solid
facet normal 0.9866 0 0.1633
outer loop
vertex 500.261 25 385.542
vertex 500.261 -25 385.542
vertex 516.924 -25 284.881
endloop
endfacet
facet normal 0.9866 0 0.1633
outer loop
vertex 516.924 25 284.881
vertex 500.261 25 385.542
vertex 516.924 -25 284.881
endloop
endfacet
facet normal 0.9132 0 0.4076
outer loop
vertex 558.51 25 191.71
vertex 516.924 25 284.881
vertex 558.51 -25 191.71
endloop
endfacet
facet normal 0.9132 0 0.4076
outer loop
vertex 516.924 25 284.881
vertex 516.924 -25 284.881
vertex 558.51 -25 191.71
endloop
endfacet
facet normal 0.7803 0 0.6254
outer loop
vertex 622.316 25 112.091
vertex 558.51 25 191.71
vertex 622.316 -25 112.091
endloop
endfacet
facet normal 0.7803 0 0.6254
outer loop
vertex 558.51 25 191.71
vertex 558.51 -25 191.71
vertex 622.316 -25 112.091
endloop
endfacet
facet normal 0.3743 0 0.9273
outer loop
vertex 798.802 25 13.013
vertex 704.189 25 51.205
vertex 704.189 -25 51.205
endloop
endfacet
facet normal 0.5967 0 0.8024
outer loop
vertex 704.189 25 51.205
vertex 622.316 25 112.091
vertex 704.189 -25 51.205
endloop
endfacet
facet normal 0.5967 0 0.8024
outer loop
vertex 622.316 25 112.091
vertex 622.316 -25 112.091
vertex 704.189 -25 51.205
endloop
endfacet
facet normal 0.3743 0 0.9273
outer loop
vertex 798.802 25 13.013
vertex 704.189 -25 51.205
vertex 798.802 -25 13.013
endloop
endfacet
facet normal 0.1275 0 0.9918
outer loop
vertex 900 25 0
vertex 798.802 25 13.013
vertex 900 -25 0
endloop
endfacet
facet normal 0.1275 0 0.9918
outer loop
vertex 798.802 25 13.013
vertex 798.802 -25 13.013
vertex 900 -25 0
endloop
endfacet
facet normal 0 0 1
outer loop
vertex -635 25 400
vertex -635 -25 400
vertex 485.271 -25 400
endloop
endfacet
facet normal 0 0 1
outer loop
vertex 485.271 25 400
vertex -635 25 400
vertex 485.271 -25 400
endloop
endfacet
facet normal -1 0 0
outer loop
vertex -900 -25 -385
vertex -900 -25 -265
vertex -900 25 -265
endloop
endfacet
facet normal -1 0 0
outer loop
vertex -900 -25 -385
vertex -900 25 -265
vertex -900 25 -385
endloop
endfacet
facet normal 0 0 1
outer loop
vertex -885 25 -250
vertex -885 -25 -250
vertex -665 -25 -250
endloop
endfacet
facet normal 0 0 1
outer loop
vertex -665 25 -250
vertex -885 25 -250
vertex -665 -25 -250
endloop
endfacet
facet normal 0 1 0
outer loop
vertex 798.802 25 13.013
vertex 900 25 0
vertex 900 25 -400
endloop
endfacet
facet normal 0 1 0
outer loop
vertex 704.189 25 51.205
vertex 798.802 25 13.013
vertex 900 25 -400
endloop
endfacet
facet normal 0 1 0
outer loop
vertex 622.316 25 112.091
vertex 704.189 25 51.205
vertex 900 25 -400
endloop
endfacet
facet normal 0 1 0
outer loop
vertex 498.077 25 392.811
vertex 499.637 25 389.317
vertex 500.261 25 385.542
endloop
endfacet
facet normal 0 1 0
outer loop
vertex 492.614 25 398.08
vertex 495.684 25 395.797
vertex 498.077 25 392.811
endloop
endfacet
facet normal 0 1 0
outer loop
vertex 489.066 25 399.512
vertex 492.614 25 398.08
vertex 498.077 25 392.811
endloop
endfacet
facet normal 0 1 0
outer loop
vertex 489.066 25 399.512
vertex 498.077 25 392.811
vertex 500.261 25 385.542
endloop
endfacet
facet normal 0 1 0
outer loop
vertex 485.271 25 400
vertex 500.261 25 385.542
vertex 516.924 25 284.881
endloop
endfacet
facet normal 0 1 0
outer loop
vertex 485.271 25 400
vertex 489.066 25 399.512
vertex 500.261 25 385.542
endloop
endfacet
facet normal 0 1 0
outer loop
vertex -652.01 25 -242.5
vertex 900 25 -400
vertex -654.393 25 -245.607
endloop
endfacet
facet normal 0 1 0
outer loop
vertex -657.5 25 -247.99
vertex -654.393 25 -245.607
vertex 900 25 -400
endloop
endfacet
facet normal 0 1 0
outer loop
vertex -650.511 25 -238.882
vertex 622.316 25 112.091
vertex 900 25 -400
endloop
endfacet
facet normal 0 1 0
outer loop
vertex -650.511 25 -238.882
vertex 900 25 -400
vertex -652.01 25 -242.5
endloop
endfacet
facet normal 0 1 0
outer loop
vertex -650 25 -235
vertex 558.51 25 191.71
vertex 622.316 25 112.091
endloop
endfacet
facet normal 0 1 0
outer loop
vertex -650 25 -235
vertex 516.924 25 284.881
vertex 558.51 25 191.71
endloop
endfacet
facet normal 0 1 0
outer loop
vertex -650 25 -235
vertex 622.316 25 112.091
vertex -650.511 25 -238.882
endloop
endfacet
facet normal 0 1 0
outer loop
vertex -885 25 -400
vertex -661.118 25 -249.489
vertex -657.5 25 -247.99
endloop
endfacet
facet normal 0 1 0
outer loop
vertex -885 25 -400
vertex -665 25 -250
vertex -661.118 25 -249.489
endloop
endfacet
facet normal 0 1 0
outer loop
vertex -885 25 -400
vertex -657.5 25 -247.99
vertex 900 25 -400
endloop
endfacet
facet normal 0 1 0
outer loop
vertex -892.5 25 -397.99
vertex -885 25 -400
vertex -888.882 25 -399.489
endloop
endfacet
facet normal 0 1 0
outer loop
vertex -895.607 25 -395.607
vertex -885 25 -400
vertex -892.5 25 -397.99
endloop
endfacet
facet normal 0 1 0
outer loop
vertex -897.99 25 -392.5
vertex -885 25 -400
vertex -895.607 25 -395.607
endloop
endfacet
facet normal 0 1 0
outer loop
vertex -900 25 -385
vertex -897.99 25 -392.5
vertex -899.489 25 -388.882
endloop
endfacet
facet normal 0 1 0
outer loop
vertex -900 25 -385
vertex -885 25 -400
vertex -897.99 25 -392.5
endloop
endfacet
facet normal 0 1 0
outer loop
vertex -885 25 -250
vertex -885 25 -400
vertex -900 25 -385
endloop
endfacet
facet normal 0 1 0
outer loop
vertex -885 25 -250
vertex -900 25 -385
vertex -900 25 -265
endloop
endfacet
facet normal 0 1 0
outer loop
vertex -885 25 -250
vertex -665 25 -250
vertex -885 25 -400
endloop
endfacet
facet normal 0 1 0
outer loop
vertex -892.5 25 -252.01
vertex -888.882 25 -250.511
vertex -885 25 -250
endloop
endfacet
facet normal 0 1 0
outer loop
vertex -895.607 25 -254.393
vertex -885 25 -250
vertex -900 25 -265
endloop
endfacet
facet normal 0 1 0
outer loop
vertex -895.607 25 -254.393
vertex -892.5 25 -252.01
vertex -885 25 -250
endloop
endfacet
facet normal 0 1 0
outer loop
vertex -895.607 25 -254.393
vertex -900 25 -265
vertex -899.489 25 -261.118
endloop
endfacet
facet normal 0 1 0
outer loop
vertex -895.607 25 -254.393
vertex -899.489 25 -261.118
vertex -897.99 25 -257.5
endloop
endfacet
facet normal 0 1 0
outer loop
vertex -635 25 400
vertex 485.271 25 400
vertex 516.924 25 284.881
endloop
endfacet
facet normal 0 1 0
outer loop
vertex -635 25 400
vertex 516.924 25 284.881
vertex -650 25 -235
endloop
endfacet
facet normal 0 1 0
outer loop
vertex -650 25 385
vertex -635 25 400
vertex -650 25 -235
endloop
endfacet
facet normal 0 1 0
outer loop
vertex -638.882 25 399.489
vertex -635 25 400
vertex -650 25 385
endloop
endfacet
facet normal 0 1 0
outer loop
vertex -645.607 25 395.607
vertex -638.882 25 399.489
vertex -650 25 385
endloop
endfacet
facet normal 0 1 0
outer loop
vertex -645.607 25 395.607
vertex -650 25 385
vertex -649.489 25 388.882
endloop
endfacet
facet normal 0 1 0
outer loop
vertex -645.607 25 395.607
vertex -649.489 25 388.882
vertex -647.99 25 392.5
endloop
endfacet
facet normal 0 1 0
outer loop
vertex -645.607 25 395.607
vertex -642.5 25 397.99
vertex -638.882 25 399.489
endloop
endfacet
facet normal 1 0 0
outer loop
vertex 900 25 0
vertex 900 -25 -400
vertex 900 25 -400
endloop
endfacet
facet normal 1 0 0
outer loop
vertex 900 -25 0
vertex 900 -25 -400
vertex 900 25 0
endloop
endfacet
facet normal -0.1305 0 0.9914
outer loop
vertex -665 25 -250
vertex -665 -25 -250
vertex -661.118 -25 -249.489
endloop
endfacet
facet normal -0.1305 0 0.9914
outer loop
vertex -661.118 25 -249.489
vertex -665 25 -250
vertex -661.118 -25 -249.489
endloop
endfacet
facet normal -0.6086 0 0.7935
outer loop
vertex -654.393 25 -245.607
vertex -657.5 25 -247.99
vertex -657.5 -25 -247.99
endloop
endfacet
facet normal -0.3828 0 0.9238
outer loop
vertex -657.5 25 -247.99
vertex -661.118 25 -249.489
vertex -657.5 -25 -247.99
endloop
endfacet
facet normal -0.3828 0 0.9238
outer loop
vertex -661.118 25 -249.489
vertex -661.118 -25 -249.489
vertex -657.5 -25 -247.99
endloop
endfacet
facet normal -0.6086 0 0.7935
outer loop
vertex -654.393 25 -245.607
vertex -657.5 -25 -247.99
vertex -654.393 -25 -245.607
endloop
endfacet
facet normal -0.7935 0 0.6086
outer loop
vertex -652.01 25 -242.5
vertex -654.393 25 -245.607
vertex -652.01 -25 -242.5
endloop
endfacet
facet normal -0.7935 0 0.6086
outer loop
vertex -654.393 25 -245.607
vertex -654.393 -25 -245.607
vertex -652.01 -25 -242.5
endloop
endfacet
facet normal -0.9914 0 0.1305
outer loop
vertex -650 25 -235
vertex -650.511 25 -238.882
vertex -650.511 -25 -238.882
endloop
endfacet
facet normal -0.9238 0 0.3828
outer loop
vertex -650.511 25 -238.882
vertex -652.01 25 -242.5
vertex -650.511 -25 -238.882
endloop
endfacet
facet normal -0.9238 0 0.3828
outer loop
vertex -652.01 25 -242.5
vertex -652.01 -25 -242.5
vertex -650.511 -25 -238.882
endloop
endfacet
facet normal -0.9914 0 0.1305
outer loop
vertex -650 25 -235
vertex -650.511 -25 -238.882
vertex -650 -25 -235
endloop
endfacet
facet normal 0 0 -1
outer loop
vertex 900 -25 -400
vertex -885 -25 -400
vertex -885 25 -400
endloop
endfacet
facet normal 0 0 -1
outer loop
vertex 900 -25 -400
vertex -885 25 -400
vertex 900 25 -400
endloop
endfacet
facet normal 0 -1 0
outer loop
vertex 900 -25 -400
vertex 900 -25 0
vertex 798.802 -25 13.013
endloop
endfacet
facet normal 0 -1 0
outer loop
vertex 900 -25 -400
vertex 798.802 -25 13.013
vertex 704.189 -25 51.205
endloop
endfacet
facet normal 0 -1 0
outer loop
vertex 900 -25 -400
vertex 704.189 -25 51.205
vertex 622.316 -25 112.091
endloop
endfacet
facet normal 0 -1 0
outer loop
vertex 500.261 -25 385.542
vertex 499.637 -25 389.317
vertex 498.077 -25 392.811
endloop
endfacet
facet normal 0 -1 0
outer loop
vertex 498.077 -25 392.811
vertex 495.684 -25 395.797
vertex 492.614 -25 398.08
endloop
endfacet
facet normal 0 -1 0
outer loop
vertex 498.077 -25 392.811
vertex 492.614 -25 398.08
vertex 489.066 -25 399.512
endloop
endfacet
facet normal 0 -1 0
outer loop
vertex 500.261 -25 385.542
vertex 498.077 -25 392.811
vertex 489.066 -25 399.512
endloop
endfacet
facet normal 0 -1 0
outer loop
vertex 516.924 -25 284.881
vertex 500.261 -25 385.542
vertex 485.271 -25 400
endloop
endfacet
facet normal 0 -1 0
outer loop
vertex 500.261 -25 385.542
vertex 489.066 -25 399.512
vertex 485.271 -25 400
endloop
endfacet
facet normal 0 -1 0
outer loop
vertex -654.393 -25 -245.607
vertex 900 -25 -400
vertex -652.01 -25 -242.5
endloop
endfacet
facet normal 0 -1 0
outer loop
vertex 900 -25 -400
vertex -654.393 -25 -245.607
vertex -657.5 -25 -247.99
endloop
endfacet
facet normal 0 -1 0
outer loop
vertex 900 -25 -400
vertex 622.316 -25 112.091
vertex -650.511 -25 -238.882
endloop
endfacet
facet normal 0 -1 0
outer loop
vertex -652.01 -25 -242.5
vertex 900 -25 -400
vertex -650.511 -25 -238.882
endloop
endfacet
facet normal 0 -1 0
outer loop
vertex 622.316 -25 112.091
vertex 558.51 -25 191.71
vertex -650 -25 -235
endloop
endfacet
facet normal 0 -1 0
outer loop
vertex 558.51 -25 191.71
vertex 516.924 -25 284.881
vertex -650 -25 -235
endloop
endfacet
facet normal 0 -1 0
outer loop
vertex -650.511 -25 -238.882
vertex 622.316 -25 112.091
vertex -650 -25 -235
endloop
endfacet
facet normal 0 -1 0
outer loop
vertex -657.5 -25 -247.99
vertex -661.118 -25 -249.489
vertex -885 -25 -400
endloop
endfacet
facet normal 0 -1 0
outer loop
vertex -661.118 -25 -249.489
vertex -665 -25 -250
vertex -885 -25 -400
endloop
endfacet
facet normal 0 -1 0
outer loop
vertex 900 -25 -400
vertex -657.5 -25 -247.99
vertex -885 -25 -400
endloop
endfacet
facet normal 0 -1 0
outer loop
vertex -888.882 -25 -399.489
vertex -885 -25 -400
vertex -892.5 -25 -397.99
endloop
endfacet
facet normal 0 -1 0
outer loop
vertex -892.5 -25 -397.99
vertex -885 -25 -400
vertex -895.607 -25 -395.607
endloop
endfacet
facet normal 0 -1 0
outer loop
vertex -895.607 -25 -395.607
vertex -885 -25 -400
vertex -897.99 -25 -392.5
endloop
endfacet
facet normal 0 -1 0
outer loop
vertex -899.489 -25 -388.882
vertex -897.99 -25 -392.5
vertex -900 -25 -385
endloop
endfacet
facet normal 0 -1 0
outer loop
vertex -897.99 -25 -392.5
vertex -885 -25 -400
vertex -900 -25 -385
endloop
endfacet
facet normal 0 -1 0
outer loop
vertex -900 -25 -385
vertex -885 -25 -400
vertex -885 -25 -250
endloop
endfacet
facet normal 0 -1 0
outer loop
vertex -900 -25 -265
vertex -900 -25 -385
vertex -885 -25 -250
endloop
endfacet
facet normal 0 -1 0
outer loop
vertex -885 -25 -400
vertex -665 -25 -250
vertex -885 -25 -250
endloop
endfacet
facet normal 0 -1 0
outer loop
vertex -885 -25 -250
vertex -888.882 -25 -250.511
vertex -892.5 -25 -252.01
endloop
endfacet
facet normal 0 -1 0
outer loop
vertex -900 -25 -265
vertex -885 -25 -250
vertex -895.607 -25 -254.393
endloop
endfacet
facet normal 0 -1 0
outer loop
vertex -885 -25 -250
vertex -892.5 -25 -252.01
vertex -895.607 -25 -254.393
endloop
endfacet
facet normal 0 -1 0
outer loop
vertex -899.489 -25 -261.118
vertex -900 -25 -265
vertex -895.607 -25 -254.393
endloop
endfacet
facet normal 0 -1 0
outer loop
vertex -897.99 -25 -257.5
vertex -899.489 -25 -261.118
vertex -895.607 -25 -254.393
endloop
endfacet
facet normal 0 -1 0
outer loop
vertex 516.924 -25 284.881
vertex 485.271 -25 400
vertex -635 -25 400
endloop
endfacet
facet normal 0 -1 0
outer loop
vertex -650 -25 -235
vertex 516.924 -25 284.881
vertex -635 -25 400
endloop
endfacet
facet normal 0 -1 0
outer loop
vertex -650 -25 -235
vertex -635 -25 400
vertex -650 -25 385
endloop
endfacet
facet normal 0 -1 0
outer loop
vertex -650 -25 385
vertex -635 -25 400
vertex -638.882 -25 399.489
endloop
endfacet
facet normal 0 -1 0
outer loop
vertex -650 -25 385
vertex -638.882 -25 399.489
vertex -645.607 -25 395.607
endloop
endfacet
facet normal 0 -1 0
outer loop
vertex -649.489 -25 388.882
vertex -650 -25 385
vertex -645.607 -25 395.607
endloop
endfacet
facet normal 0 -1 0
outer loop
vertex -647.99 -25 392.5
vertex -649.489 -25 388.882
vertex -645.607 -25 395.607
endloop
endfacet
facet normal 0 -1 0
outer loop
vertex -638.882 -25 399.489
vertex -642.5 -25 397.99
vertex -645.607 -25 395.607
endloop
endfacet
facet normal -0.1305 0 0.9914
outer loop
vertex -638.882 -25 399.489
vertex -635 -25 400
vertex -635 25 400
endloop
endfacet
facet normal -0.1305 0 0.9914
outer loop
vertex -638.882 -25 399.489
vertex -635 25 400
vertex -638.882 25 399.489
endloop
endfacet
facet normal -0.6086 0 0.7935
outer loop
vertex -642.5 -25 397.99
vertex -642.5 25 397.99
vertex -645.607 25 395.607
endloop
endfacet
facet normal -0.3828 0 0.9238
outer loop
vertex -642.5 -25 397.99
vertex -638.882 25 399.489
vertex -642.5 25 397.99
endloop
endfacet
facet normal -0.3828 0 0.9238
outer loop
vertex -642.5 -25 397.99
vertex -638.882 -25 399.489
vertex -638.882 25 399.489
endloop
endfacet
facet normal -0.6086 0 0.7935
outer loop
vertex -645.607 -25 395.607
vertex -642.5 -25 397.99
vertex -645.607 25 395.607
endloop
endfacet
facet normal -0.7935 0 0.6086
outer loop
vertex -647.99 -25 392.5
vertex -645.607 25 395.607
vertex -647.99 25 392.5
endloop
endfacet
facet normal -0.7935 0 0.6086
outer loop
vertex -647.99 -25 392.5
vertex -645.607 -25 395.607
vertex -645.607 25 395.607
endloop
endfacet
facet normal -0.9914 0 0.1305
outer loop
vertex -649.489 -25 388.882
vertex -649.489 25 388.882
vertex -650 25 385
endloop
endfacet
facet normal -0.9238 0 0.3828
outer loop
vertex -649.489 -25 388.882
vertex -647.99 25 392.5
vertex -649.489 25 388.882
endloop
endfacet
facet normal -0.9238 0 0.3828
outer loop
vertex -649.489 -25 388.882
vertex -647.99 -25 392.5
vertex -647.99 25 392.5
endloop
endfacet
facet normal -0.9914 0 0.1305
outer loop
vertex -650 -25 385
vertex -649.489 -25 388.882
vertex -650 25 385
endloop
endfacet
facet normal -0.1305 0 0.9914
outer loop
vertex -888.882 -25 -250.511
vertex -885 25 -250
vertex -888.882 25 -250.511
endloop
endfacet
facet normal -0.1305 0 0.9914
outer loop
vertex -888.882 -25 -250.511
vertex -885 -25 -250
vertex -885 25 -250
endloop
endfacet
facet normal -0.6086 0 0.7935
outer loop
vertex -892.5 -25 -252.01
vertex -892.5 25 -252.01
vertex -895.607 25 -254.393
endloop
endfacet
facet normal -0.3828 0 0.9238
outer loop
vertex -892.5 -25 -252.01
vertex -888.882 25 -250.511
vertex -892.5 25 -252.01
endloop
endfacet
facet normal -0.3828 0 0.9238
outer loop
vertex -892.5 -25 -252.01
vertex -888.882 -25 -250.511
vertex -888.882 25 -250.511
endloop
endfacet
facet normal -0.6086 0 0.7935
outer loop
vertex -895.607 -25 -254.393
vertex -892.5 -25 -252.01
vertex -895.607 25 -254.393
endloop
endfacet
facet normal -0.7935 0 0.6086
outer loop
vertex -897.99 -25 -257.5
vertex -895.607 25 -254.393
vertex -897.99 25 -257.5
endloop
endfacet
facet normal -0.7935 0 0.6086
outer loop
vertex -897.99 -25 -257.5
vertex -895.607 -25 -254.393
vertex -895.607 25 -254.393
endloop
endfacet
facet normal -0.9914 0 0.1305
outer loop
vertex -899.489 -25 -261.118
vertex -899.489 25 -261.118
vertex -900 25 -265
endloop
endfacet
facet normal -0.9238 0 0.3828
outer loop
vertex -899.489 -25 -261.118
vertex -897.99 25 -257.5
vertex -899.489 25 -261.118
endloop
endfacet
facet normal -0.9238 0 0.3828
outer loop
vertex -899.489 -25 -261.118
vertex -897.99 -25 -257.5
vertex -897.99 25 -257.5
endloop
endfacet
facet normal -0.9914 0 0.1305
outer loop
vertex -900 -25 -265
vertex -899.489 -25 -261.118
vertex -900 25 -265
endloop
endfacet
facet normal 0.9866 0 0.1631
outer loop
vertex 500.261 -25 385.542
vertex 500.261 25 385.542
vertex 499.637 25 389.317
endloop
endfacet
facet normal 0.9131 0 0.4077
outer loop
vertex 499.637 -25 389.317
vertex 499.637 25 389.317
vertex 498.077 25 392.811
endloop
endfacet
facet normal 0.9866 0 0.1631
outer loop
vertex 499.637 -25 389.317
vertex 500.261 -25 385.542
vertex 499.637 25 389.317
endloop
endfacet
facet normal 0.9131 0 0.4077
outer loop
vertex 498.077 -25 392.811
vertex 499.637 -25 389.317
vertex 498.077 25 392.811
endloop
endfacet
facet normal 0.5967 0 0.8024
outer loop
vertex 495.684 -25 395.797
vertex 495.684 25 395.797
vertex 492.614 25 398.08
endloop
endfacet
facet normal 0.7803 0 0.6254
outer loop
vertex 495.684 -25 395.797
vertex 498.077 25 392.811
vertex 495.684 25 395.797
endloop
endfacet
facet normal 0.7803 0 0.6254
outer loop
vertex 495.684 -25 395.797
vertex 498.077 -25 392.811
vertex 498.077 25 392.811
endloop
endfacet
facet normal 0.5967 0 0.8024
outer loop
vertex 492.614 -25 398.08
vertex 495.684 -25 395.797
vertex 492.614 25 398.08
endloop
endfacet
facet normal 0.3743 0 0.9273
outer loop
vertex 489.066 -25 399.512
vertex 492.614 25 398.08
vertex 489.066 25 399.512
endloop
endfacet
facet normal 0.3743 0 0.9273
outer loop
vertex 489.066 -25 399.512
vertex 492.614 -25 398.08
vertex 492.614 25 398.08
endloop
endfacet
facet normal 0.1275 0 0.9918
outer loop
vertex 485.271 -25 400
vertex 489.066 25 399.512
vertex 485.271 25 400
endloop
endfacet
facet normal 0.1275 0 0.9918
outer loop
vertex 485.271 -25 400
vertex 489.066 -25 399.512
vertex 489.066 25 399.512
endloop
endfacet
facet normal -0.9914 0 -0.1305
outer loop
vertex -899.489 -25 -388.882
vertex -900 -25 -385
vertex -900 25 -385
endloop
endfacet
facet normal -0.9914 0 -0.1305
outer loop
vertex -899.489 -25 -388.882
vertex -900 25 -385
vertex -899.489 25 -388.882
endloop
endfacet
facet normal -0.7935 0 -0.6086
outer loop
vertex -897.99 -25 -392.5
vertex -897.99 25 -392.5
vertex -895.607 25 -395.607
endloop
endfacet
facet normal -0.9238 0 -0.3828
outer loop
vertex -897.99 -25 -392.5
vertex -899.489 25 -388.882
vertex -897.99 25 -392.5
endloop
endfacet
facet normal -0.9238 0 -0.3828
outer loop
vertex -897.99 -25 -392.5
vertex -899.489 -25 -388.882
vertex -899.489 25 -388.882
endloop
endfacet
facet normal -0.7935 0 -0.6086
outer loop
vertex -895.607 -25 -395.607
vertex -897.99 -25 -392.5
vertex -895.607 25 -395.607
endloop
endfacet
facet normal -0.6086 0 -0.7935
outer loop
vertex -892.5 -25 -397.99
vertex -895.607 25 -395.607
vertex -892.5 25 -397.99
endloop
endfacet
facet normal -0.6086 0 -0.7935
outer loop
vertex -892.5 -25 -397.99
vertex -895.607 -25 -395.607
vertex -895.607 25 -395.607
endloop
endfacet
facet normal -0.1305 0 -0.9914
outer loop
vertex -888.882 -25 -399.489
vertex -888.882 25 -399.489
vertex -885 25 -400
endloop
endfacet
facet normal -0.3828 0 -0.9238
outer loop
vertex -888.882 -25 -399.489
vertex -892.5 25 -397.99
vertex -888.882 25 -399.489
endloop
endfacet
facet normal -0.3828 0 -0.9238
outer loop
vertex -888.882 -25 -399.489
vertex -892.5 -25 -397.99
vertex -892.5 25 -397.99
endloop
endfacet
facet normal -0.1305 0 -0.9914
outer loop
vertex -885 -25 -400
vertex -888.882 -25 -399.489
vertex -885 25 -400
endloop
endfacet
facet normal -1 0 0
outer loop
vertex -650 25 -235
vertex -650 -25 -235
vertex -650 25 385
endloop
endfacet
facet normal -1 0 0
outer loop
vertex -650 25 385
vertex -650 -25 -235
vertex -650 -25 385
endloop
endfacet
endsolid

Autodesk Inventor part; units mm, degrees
ref_plane "YZ Plane" through (0, 0, 0) normal (1, 0, 0) x (0, 1, 0)
ref_plane "XZ Plane" through (0, 0, 0) normal (0, 1, 0) x (-1, 0, 0)
ref_plane "XY Plane" through (0, 0, 0) normal (0, 0, 1) x (1, 0, 0)
sketch "Esboço1" plane through (0, 0, 0) normal (0, 1, 0) x (-1, 0, 0)
  line L0 (-900, 400) -> (900, 400) construction
  line L1 (900, 400) -> (900, -400) construction
  line L2 (900, -400) -> (-900, -400) construction
  line L3 (-900, -400) -> (-900, 400) construction
  line L4 (-900, 400) -> (900, -400) construction
  line L5 (900, 400) -> (-900, -400) construction
  line L6 (900, -250) -> (650, -250) construction
  line L7 (650, -250) -> (650, 400) construction
  arc A0 (885, -400) -> (900, -385) centre (885, -385) ccw
  arc A1 (650, -235) -> (665, -250) centre (665, -235) ccw
  line L8 (885, -400) -> (-900, -400)
  line L9 (900, -385) -> (900, -250) construction
  line L10 (900, -250) -> (665, -250) construction
  line L11 (-900, -400) -> (-1700, -400) construction
  line L12 (-1700, -400) -> (-1700, 1400) construction
  line L13 (-1700, 1400) -> (-900, 1400) construction
  line L14 (-900, 1400) -> (-900, -400) construction
  circle A2 centre (-900, 400) radius 400 construction
  line L15 (900, 0) -> (-900, 0) construction
  line L16 (-1300, 1400) -> (-1300, -404.7673) construction
  arc A3 (-485.2712, 400) -> (-500.2614, 385.5422) centre (-485.2712, 385) ccw
  line L17 (650, -235) -> (650, 385)
  arc A4 (650, 385) -> (635, 400) centre (635, 385) ccw
  line L18 (635, 400) -> (-485.2712, 400)
  arc A5 (-900, 0) -> (-500.2614, 385.5422) centre (-900, 400) ccw
  line L19 (-900, -400) -> (-900, 0)
  arc A6 (900, -265) -> (885, -250) centre (885, -265) ccw
  line L20 (900, -265) -> (900, -385)
  line L21 (885, -250) -> (665, -250)
  point P0 (0, 0)
  dimension "d11" = 800
  dimension "d0" = 800
  dimension "d1" = 1800
  dimension "d3" = 650
  dimension "d5" = 15
  dimension "d6" = 800
  dimension "d7" = 1800
  dimension "d9" = 250
  dimension "d13" = 400
  dimension "d14" = 400
  dimension "d15" = 400
sketch "Esboço3" plane through (0, 0, 0) normal (0, 1, 0) x (-1, 0, 0)
  line L0 (-900, 400) -> (900, 400) construction
  line L1 (900, 400) -> (900, -400) construction
  line L2 (900, -400) -> (-900, -400) construction
  line L3 (-900, -400) -> (-900, 400) construction
  line L4 (-900, 400) -> (900, -400) construction
  line L5 (900, 400) -> (-900, -400) construction
  arc A0 (-900, -350) -> (-850, -400) centre (-850, -350) ccw
  arc A1 (850, -400) -> (900, -350) centre (850, -350) ccw
  line L6 (900, 0) -> (-900, 0) construction
  line L7 (700, 400) -> (700, 0) construction
  line L8 (850, -400) -> (-850, -400)
  line L9 (900, -350) -> (900, 400)
  line L10 (-900, -350) -> (-900, -350)
  line L11 (-900, -309.491) -> (-900, -350)
  arc A2 (-850, 400) -> (-900, 350) centre (-850, 350) ccw
  line L12 (-900, -309.491) -> (-900, 350)
  circle A3 centre (300, 400) radius 400 construction
  arc A4 (-97.5232, 355.5556) -> (-147.2136, 400) centre (-147.2136, 350) ccw
  line L13 (900, 400) -> (700, 400)
  line L14 (-147.2136, 400) -> (-850, 400)
  arc A5 (-97.5232, 355.5556) -> (700, 400) centre (300, 400) ccw
  point P0 (0, 0)
  point P1 (-498.6068, 400)
  dimension "d16" = 1800
  dimension "d17" = 800
  dimension "d19" = 200
  dimension "d20" = 50
  dimension "d21" = 800
extrude "Extrusão1" add sketch "Esboço1" along normal mid plane 50
equation "\"d6\" = d0"
equation "\"d7\" = d1"
properties part number "Lado Esquerdo Mesa"
